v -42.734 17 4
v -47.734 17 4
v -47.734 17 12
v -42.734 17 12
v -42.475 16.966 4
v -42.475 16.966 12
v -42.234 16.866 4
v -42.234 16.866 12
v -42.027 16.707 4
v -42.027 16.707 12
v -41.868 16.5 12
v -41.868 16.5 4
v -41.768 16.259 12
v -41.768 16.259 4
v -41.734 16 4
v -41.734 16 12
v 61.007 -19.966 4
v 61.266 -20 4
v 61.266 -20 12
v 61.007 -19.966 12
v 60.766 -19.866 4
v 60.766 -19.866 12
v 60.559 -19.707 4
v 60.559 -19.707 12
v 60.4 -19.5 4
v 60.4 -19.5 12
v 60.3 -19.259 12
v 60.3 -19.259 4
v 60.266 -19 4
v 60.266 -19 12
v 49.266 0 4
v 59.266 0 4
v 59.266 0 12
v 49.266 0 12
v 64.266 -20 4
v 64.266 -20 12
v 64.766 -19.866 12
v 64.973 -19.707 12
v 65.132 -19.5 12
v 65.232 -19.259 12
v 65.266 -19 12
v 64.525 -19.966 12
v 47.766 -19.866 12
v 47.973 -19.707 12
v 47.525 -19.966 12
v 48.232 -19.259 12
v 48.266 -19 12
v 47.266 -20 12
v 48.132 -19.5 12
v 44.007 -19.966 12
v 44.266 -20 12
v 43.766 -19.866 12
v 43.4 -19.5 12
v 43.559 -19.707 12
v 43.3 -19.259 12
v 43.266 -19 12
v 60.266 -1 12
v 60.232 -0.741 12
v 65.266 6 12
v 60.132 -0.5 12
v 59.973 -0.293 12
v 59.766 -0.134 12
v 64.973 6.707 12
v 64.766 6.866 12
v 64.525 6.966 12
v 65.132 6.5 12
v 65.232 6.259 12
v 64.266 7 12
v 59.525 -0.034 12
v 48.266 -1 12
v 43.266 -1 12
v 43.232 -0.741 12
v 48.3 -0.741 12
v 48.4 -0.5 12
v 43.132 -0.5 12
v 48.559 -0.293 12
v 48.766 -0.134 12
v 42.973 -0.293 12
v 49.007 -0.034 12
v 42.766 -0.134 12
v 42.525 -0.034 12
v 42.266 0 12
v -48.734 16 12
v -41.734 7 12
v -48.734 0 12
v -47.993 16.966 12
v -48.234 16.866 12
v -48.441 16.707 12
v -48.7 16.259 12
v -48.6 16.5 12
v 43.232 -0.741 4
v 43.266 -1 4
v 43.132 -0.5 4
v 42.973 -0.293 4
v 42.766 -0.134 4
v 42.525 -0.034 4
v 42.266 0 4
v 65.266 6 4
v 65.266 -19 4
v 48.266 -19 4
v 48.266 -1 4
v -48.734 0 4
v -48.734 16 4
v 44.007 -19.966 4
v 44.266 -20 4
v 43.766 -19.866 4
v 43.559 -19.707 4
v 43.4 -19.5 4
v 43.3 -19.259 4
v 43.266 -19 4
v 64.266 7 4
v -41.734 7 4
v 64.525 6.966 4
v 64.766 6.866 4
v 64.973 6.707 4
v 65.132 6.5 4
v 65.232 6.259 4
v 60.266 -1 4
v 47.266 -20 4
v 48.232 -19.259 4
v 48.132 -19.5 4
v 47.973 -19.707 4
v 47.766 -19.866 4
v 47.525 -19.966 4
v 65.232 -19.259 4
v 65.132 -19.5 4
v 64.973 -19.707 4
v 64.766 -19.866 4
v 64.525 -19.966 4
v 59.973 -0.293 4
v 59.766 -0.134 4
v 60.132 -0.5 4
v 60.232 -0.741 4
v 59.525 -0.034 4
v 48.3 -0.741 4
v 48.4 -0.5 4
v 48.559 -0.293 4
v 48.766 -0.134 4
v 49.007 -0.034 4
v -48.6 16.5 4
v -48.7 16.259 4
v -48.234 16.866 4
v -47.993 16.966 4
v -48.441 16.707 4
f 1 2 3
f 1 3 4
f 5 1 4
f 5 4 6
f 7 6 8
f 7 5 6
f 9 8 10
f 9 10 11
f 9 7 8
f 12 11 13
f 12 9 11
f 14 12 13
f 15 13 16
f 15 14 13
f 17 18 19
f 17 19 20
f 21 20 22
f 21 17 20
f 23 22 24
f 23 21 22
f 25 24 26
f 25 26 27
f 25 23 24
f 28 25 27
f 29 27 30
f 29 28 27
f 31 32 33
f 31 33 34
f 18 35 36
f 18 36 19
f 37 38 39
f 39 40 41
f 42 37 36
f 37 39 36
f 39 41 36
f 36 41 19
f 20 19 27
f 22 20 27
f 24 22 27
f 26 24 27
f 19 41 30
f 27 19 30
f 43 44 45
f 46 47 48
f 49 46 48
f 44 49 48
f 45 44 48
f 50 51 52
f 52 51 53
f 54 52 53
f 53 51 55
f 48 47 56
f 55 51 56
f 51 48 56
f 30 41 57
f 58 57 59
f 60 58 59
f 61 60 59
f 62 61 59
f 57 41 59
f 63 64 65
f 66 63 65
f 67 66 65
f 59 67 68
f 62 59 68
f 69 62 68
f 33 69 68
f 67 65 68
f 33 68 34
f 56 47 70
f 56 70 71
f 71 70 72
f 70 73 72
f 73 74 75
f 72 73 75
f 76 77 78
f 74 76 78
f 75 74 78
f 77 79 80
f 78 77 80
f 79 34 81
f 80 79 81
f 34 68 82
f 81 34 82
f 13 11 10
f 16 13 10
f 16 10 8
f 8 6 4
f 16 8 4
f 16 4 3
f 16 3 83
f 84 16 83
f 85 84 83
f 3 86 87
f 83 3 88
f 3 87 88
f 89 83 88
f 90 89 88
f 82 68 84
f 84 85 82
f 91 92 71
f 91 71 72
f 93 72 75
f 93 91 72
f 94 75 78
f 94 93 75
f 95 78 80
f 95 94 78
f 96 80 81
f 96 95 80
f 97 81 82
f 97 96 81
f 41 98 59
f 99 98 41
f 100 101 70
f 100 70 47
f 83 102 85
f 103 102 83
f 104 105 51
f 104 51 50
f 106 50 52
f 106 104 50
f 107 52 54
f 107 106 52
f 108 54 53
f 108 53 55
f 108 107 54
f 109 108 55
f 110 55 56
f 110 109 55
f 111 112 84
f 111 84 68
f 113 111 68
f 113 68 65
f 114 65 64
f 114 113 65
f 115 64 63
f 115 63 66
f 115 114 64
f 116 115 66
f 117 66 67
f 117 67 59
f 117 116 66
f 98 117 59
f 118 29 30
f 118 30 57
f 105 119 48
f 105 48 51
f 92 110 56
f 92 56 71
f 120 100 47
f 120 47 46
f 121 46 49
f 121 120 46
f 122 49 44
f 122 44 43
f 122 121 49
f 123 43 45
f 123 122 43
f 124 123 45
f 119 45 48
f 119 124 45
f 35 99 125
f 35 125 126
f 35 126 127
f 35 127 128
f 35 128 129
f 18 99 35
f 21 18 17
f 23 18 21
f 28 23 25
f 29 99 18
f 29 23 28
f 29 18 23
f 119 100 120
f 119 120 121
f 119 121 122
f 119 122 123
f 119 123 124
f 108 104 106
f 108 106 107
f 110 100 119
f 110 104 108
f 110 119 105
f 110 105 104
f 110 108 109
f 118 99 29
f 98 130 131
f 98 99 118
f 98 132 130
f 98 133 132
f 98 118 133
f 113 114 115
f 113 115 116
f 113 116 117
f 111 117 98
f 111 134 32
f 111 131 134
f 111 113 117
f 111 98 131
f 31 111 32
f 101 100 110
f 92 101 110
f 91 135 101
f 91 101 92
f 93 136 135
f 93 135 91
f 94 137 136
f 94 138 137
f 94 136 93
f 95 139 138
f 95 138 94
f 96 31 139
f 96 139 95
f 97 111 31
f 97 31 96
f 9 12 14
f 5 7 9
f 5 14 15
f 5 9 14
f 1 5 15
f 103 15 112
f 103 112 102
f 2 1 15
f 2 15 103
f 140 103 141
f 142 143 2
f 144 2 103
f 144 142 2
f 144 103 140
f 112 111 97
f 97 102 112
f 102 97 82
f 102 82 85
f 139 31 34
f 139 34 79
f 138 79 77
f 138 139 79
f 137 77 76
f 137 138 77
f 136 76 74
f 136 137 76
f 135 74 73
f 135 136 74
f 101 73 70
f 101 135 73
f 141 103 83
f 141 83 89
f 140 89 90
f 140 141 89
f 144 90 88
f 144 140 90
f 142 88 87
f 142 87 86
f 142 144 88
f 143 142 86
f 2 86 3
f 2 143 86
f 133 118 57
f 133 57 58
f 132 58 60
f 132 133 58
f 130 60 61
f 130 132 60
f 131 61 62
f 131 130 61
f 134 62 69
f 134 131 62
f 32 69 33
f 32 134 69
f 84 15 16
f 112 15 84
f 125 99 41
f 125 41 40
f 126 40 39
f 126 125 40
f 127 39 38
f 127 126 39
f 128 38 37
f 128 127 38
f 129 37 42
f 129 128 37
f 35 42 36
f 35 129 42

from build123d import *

# Parameters (mm, degrees)
EXTRUDE_1_DEPTH     = 12
CUT_EXTRUDE_1_DEPTH = 82


with BuildPart() as part:
    # Эскиз1 → Бобышка-Вытянуть1 (new body)
    with BuildSketch(Plane.XY):
        with BuildLine():
            Line((-47.73428915, 17), (-42.73428915, 17))
            ThreePointArc((-42.73428915, 17), (-42.027182368, 16.707106781), (-41.73428915, 16))
            Line((-41.73428915, 16), (-41.73428915, 7))
            Line((-41.73428915, 7), (25.229943888, 7))
            Line((25.229943888, 7), (64.26571085, 7))
            ThreePointArc((64.26571085, 7), (64.972817632, 6.707106781), (65.26571085, 6))
            Line((65.26571085, 6), (65.26571085, -19))
            ThreePointArc((65.26571085, -19), (64.972817632, -19.707106781), (64.26571085, -20))
            Line((64.26571085, -20), (61.26571085, -20))
            ThreePointArc((61.26571085, -20), (60.558604069, -19.707106781), (60.26571085, -19))
            Line((60.26571085, -19), (60.26571085, -1))
            ThreePointArc((60.26571085, -1), (59.972817632, -0.292893219), (59.26571085, 0))
            Line((59.26571085, 0), (49.26571085, 0))
            ThreePointArc((49.26571085, 0), (48.558604069, -0.292893219), (48.26571085, -1))
            Line((48.26571085, -1), (48.26571085, -19))
            ThreePointArc((48.26571085, -19), (47.972817632, -19.707106781), (47.26571085, -20))
            Line((47.26571085, -20), (44.26571085, -20))
            ThreePointArc((44.26571085, -20), (43.558604069, -19.707106781), (43.26571085, -19))
            Line((43.26571085, -19), (43.26571085, -1))
            ThreePointArc((43.26571085, -1), (42.972817632, -0.292893219), (42.26571085, 0))
            Line((42.26571085, 0), (-48.73428915, 0))
            Line((-48.73428915, 0), (-48.73428915, 16))
            ThreePointArc((-48.73428915, 16), (-48.441395931, 16.707106781), (-47.73428915, 17))
        make_face()
    extrude(amount=EXTRUDE_1_DEPTH)

    # Эскиз2 → Вырез-Вытянуть1 (cut)
    with BuildSketch(Plane(origin=(0, 17, 0), x_dir=(1, 0, 0), z_dir=(0, 1, 0))):
        Polygon((81.423814873, -4), (-154.472854851, -4), (-146.348766817, 32.606222342), (92.957474686, 29.235711898), align=None)
        Polygon((81.423814873, -16), (-154.472854851, -16), (-172.112104827, -50.666366553), (103.309756763, -54.545547702), align=None)
    extrude(amount=-CUT_EXTRUDE_1_DEPTH, mode=Mode.SUBTRACT)


solid = part.part
